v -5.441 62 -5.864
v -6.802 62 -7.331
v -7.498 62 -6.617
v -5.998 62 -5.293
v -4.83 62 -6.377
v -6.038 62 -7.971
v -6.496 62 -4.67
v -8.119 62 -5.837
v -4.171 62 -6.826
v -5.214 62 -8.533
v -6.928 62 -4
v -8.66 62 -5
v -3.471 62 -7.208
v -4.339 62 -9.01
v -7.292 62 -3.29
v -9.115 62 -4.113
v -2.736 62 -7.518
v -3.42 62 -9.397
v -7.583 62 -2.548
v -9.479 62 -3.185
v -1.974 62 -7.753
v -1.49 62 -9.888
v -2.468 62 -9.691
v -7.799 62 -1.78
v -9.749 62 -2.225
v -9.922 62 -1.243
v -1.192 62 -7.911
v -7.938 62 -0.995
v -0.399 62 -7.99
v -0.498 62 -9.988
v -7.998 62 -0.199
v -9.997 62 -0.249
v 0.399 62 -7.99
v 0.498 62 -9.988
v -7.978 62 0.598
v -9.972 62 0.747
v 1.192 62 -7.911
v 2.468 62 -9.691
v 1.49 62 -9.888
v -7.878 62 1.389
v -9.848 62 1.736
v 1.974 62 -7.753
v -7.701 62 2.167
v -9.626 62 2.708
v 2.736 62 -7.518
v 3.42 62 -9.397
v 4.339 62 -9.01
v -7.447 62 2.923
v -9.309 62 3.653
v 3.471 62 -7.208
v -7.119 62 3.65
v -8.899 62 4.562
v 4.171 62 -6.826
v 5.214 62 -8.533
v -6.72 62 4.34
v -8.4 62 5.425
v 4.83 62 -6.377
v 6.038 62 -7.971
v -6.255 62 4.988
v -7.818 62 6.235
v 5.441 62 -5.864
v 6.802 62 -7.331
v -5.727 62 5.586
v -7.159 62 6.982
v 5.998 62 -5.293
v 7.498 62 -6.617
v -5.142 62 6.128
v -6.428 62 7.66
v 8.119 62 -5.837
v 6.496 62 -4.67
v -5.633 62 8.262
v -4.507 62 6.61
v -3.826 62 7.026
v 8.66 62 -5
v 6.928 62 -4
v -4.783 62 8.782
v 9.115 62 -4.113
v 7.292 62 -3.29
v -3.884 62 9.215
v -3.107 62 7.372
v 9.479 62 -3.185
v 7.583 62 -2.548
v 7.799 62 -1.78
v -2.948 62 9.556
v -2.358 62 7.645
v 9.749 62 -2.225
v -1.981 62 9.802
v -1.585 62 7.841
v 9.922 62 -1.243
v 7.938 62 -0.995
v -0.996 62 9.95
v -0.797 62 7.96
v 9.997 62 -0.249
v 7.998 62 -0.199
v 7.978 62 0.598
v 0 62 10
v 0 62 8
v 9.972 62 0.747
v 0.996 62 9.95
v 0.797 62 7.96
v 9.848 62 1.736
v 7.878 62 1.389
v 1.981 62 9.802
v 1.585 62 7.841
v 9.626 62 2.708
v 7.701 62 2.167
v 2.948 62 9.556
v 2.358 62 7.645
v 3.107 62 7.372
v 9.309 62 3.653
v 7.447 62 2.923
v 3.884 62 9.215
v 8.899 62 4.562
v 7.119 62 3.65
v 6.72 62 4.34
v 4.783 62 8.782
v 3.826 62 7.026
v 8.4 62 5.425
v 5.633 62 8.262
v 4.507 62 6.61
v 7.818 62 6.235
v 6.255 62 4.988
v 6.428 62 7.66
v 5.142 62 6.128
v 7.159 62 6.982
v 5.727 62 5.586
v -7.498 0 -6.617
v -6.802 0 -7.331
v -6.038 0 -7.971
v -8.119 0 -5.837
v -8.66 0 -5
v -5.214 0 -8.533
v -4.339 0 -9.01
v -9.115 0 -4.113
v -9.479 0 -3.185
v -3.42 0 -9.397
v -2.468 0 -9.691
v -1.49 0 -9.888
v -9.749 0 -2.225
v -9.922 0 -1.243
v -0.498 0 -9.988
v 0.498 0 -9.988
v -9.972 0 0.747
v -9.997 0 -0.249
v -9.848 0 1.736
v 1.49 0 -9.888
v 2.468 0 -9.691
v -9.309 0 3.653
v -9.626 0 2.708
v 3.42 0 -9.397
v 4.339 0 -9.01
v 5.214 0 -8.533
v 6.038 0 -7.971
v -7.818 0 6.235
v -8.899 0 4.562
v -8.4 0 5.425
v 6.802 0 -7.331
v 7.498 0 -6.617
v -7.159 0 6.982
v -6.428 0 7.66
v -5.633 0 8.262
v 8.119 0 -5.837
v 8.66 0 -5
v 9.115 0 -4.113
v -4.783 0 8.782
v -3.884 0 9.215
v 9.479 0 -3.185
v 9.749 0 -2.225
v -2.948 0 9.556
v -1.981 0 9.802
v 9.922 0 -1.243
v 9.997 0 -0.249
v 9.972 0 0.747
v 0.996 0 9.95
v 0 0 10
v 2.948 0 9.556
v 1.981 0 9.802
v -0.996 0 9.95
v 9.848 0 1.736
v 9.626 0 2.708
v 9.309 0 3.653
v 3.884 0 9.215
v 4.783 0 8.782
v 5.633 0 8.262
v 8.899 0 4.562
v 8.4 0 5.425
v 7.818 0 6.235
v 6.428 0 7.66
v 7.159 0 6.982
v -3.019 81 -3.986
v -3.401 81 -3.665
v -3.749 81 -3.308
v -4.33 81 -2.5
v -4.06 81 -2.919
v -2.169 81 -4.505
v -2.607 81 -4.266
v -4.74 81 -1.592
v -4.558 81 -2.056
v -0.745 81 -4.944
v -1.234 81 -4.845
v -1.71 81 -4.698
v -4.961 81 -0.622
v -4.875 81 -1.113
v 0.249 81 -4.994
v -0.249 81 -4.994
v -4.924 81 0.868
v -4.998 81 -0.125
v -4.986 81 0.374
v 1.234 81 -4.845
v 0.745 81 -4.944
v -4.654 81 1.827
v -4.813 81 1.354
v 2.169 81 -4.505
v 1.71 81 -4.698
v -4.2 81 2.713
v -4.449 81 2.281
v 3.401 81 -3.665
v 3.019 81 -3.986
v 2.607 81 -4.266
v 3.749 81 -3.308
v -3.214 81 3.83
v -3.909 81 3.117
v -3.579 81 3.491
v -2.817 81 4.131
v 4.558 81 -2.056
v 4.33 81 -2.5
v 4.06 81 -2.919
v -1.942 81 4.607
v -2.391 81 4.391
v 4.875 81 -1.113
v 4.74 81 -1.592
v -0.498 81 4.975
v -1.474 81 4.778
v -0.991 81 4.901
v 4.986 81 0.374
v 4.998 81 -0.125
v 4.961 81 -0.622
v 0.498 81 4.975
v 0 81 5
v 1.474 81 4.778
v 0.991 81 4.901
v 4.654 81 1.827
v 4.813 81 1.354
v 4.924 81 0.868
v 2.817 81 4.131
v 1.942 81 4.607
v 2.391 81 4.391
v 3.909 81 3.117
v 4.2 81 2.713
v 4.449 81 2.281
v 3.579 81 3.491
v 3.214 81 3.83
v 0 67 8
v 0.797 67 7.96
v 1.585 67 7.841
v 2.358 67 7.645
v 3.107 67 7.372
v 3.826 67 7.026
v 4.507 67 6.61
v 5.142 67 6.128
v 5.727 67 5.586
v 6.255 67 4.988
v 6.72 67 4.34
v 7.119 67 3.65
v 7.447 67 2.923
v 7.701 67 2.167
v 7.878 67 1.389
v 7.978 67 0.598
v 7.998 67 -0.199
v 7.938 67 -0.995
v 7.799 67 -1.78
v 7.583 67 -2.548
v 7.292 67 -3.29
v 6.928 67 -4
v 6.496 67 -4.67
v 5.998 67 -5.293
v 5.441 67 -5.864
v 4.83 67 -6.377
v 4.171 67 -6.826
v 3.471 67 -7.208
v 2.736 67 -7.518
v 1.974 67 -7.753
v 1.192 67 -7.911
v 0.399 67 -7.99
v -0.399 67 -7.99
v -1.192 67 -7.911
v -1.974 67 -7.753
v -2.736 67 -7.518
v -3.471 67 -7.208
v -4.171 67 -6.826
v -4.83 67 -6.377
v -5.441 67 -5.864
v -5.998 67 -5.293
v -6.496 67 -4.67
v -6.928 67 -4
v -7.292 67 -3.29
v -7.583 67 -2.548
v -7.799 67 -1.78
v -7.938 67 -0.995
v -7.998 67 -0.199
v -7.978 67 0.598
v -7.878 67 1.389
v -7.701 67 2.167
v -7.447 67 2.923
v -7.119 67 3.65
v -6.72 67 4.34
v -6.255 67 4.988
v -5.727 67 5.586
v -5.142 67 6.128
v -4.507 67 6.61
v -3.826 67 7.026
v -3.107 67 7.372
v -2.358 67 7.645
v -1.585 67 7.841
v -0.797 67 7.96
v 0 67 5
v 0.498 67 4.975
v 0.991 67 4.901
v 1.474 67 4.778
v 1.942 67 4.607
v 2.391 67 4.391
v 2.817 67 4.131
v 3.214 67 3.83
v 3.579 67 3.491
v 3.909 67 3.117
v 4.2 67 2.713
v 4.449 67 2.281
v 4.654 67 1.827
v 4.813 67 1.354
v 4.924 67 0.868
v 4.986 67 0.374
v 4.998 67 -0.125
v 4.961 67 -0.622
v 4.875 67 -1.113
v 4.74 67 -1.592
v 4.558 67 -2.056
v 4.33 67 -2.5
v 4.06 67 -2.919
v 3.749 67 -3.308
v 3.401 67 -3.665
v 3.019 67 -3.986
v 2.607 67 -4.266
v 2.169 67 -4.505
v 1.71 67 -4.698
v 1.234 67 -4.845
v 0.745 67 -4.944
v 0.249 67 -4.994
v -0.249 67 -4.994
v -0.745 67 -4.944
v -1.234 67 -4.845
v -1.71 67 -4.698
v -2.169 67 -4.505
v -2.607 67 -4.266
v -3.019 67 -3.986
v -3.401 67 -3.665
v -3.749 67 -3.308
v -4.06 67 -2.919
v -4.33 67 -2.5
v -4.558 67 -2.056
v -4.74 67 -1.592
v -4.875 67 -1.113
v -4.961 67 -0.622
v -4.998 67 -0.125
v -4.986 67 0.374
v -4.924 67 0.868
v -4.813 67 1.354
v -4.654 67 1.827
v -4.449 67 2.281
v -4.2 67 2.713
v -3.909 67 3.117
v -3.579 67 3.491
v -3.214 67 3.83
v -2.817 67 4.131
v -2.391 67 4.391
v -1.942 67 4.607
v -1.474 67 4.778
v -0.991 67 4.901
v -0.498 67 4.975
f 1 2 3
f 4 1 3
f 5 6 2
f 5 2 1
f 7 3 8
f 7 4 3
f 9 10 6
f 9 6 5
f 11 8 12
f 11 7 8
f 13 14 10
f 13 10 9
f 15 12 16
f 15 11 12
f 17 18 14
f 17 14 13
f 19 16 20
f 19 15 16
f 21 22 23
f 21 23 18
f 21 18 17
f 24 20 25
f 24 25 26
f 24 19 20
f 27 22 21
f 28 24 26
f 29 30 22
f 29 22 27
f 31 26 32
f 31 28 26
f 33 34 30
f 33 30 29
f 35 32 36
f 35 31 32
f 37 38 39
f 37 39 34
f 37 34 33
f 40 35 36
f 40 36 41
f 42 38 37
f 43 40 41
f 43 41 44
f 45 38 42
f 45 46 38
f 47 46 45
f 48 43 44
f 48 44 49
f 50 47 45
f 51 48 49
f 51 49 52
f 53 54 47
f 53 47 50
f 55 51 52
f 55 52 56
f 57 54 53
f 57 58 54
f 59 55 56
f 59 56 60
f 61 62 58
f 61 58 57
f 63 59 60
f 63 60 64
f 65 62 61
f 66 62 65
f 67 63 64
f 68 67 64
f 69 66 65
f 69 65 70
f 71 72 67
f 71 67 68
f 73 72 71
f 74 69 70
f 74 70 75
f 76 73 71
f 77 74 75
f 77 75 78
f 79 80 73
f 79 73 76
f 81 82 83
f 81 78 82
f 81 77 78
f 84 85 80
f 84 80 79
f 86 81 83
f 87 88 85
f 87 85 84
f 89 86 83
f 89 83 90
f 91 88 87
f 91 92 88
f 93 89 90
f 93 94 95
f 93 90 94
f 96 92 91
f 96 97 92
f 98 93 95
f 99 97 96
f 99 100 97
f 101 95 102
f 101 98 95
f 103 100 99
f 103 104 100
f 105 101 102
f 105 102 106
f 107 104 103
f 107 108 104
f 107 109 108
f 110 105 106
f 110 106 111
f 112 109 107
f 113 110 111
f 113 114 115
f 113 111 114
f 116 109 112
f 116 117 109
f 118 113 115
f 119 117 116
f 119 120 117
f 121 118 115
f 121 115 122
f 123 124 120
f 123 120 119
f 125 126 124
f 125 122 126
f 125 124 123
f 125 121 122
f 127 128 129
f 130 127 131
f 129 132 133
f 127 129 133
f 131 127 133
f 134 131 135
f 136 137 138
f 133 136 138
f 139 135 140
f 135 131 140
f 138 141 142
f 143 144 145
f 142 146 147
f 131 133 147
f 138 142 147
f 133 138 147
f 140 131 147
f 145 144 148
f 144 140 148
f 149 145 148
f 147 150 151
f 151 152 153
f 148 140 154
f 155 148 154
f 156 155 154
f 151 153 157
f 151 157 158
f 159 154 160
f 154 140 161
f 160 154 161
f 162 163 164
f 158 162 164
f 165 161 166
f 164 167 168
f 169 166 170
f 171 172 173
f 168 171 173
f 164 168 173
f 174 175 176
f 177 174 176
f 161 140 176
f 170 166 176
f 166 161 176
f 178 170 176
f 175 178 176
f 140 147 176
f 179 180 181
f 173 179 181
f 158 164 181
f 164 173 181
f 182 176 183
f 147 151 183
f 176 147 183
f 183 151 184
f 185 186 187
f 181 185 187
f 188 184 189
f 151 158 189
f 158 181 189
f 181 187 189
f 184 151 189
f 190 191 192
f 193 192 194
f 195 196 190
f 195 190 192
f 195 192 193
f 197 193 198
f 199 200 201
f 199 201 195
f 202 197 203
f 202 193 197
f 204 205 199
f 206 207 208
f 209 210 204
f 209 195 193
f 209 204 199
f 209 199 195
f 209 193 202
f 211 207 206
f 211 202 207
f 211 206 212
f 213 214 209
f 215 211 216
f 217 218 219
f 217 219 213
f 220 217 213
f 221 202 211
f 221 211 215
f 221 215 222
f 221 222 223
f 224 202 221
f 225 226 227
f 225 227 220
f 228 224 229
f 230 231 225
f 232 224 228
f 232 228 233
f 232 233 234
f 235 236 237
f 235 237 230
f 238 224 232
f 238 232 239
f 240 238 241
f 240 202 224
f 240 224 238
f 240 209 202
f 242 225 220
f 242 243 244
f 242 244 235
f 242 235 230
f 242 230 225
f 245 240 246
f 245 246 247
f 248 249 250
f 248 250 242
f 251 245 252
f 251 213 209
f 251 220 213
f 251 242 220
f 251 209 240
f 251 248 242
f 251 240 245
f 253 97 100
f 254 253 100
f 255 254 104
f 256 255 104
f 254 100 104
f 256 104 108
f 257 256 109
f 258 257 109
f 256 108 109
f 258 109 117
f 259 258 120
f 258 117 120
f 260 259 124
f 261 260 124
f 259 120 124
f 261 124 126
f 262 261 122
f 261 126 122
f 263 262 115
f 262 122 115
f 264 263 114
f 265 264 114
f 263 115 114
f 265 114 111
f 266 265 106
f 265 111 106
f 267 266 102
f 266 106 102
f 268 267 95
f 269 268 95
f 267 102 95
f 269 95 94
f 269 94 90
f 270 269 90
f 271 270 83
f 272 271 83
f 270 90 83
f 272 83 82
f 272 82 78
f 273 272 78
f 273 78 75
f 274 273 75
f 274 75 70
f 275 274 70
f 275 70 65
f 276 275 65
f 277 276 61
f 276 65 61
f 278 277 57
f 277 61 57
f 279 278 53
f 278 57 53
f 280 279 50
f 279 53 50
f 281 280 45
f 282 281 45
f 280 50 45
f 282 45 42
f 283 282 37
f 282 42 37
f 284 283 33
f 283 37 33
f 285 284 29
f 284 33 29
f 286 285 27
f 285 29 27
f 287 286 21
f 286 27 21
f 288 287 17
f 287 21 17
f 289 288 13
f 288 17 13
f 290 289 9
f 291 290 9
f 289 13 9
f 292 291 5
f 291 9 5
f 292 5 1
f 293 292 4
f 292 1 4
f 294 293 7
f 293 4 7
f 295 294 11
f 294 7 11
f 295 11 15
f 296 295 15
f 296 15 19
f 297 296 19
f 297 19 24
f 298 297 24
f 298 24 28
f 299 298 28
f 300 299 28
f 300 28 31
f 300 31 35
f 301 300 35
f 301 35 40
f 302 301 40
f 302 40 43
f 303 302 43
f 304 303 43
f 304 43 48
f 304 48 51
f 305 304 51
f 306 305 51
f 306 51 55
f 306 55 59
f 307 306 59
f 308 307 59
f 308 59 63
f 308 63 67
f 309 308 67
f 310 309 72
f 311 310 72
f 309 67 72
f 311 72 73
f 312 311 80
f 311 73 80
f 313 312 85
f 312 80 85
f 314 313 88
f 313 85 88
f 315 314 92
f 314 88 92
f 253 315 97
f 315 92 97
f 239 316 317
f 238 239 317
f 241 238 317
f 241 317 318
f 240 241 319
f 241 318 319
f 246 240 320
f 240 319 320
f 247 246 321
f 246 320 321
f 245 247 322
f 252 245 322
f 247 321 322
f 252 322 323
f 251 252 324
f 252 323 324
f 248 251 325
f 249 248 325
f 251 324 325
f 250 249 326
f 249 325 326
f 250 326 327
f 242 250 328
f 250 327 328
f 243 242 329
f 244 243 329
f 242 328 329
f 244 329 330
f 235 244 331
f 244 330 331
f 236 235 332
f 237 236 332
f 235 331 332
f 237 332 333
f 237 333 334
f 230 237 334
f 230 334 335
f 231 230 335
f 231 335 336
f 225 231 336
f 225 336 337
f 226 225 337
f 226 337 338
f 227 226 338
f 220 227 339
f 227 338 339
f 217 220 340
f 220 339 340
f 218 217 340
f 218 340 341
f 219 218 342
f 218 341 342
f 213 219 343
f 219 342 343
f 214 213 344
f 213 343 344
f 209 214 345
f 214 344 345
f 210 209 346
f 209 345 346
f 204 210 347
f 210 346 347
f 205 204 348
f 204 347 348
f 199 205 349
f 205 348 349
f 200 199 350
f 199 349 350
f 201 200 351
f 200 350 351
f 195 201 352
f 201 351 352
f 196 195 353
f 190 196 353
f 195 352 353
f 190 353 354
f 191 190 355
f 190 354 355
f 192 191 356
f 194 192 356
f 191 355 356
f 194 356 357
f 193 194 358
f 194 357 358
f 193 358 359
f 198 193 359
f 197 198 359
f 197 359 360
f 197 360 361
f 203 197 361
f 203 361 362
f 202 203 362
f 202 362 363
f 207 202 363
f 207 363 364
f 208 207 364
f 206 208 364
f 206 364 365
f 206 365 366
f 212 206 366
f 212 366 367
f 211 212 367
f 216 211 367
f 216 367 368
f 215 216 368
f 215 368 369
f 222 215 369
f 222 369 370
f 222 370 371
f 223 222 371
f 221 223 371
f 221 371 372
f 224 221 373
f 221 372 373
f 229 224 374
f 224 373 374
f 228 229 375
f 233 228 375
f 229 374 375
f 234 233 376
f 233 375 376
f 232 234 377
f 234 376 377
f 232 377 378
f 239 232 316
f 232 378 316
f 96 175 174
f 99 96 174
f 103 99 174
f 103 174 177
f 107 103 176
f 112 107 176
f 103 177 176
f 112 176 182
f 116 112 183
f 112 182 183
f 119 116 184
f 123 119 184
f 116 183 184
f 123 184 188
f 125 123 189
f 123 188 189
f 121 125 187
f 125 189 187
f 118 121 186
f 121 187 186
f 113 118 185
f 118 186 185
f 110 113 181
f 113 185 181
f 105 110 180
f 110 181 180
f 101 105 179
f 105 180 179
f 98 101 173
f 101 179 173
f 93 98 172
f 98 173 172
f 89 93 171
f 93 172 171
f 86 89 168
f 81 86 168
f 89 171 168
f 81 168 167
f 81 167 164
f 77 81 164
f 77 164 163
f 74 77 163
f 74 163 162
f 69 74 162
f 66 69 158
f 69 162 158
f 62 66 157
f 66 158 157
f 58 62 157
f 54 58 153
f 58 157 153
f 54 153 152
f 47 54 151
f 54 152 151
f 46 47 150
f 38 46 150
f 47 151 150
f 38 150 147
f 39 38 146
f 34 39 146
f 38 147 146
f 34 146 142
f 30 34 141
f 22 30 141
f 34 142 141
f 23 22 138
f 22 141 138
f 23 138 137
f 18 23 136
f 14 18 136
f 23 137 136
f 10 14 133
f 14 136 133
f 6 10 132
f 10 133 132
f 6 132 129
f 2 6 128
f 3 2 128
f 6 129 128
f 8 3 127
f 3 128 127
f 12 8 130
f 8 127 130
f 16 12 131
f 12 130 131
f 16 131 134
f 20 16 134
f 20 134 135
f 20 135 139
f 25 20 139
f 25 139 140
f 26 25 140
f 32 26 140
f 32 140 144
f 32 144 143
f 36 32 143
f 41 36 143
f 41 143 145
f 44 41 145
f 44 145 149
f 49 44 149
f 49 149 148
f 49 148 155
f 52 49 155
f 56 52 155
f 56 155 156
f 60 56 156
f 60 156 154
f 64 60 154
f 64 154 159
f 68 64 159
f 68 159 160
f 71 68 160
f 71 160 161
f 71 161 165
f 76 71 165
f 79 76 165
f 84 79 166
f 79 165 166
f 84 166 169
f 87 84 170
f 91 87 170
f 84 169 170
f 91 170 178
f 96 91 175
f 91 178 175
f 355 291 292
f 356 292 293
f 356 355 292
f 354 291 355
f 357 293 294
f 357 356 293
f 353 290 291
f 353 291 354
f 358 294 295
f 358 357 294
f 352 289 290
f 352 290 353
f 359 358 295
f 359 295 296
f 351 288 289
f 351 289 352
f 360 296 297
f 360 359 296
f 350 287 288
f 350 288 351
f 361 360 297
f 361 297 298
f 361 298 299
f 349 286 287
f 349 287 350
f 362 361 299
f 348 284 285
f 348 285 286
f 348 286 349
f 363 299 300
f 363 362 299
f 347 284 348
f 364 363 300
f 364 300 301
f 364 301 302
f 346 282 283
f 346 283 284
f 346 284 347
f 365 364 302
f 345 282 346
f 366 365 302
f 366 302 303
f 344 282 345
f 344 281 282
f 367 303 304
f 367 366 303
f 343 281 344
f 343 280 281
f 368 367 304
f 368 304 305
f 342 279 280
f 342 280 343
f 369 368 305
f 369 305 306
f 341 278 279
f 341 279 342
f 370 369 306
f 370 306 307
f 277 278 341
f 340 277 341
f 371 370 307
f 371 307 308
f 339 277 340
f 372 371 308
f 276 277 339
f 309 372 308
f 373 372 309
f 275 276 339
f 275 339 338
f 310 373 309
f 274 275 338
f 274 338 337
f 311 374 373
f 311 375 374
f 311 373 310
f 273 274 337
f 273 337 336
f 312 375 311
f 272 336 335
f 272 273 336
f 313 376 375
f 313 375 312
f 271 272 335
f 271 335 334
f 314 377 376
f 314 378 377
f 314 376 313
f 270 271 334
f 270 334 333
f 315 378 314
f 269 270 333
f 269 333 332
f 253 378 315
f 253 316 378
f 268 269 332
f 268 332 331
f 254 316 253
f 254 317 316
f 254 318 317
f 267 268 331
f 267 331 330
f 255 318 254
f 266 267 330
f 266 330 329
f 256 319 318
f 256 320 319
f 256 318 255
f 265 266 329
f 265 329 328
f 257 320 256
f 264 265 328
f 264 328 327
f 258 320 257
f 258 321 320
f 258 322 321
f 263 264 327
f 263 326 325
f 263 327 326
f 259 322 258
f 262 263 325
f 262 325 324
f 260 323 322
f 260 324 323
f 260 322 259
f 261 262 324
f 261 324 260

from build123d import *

# Parameters (mm, degrees)
ESQUISSE1_R        = 10
BOSS_EXTRU_1_DEPTH = 62
ESQUISSE2_R        = 8
BOSS_EXTRU_2_DEPTH = 5
ESQUISSE3_R        = 5
BOSS_EXTRU_3_DEPTH = 14


with BuildPart() as part:
    # Esquisse1 → Boss.-Extru.1 (new body)
    with BuildSketch(Plane(origin=(0, 0, 0), x_dir=(1, 0, 0), z_dir=(0, 1, 0))):
        with Locations(Location((0, 0, 0), (0, 0, 270))):  # turned: the seam where the file's is
            Circle(ESQUISSE1_R)
    extrude(amount=BOSS_EXTRU_1_DEPTH)

    # Esquisse2 → Boss.-Extru.2 (add)
    with BuildSketch(Plane(origin=(0, 62, 0), x_dir=(1, 0, 0), z_dir=(0, 1, 0))):
        with Locations(Location((0, 0, 0), (0, 0, 270))):  # turned: the seam where the file's is
            Circle(ESQUISSE2_R)
    extrude(amount=BOSS_EXTRU_2_DEPTH)

    # Esquisse3 → Boss.-Extru.3 (add)
    with BuildSketch(Plane(origin=(0, 67, 0), x_dir=(1, 0, 0), z_dir=(0, 1, 0))):
        with Locations(Location((0, 0, 0), (0, 0, 270))):  # turned: the seam where the file's is
            Circle(ESQUISSE3_R)
    extrude(amount=BOSS_EXTRU_3_DEPTH)


solid = part.part
